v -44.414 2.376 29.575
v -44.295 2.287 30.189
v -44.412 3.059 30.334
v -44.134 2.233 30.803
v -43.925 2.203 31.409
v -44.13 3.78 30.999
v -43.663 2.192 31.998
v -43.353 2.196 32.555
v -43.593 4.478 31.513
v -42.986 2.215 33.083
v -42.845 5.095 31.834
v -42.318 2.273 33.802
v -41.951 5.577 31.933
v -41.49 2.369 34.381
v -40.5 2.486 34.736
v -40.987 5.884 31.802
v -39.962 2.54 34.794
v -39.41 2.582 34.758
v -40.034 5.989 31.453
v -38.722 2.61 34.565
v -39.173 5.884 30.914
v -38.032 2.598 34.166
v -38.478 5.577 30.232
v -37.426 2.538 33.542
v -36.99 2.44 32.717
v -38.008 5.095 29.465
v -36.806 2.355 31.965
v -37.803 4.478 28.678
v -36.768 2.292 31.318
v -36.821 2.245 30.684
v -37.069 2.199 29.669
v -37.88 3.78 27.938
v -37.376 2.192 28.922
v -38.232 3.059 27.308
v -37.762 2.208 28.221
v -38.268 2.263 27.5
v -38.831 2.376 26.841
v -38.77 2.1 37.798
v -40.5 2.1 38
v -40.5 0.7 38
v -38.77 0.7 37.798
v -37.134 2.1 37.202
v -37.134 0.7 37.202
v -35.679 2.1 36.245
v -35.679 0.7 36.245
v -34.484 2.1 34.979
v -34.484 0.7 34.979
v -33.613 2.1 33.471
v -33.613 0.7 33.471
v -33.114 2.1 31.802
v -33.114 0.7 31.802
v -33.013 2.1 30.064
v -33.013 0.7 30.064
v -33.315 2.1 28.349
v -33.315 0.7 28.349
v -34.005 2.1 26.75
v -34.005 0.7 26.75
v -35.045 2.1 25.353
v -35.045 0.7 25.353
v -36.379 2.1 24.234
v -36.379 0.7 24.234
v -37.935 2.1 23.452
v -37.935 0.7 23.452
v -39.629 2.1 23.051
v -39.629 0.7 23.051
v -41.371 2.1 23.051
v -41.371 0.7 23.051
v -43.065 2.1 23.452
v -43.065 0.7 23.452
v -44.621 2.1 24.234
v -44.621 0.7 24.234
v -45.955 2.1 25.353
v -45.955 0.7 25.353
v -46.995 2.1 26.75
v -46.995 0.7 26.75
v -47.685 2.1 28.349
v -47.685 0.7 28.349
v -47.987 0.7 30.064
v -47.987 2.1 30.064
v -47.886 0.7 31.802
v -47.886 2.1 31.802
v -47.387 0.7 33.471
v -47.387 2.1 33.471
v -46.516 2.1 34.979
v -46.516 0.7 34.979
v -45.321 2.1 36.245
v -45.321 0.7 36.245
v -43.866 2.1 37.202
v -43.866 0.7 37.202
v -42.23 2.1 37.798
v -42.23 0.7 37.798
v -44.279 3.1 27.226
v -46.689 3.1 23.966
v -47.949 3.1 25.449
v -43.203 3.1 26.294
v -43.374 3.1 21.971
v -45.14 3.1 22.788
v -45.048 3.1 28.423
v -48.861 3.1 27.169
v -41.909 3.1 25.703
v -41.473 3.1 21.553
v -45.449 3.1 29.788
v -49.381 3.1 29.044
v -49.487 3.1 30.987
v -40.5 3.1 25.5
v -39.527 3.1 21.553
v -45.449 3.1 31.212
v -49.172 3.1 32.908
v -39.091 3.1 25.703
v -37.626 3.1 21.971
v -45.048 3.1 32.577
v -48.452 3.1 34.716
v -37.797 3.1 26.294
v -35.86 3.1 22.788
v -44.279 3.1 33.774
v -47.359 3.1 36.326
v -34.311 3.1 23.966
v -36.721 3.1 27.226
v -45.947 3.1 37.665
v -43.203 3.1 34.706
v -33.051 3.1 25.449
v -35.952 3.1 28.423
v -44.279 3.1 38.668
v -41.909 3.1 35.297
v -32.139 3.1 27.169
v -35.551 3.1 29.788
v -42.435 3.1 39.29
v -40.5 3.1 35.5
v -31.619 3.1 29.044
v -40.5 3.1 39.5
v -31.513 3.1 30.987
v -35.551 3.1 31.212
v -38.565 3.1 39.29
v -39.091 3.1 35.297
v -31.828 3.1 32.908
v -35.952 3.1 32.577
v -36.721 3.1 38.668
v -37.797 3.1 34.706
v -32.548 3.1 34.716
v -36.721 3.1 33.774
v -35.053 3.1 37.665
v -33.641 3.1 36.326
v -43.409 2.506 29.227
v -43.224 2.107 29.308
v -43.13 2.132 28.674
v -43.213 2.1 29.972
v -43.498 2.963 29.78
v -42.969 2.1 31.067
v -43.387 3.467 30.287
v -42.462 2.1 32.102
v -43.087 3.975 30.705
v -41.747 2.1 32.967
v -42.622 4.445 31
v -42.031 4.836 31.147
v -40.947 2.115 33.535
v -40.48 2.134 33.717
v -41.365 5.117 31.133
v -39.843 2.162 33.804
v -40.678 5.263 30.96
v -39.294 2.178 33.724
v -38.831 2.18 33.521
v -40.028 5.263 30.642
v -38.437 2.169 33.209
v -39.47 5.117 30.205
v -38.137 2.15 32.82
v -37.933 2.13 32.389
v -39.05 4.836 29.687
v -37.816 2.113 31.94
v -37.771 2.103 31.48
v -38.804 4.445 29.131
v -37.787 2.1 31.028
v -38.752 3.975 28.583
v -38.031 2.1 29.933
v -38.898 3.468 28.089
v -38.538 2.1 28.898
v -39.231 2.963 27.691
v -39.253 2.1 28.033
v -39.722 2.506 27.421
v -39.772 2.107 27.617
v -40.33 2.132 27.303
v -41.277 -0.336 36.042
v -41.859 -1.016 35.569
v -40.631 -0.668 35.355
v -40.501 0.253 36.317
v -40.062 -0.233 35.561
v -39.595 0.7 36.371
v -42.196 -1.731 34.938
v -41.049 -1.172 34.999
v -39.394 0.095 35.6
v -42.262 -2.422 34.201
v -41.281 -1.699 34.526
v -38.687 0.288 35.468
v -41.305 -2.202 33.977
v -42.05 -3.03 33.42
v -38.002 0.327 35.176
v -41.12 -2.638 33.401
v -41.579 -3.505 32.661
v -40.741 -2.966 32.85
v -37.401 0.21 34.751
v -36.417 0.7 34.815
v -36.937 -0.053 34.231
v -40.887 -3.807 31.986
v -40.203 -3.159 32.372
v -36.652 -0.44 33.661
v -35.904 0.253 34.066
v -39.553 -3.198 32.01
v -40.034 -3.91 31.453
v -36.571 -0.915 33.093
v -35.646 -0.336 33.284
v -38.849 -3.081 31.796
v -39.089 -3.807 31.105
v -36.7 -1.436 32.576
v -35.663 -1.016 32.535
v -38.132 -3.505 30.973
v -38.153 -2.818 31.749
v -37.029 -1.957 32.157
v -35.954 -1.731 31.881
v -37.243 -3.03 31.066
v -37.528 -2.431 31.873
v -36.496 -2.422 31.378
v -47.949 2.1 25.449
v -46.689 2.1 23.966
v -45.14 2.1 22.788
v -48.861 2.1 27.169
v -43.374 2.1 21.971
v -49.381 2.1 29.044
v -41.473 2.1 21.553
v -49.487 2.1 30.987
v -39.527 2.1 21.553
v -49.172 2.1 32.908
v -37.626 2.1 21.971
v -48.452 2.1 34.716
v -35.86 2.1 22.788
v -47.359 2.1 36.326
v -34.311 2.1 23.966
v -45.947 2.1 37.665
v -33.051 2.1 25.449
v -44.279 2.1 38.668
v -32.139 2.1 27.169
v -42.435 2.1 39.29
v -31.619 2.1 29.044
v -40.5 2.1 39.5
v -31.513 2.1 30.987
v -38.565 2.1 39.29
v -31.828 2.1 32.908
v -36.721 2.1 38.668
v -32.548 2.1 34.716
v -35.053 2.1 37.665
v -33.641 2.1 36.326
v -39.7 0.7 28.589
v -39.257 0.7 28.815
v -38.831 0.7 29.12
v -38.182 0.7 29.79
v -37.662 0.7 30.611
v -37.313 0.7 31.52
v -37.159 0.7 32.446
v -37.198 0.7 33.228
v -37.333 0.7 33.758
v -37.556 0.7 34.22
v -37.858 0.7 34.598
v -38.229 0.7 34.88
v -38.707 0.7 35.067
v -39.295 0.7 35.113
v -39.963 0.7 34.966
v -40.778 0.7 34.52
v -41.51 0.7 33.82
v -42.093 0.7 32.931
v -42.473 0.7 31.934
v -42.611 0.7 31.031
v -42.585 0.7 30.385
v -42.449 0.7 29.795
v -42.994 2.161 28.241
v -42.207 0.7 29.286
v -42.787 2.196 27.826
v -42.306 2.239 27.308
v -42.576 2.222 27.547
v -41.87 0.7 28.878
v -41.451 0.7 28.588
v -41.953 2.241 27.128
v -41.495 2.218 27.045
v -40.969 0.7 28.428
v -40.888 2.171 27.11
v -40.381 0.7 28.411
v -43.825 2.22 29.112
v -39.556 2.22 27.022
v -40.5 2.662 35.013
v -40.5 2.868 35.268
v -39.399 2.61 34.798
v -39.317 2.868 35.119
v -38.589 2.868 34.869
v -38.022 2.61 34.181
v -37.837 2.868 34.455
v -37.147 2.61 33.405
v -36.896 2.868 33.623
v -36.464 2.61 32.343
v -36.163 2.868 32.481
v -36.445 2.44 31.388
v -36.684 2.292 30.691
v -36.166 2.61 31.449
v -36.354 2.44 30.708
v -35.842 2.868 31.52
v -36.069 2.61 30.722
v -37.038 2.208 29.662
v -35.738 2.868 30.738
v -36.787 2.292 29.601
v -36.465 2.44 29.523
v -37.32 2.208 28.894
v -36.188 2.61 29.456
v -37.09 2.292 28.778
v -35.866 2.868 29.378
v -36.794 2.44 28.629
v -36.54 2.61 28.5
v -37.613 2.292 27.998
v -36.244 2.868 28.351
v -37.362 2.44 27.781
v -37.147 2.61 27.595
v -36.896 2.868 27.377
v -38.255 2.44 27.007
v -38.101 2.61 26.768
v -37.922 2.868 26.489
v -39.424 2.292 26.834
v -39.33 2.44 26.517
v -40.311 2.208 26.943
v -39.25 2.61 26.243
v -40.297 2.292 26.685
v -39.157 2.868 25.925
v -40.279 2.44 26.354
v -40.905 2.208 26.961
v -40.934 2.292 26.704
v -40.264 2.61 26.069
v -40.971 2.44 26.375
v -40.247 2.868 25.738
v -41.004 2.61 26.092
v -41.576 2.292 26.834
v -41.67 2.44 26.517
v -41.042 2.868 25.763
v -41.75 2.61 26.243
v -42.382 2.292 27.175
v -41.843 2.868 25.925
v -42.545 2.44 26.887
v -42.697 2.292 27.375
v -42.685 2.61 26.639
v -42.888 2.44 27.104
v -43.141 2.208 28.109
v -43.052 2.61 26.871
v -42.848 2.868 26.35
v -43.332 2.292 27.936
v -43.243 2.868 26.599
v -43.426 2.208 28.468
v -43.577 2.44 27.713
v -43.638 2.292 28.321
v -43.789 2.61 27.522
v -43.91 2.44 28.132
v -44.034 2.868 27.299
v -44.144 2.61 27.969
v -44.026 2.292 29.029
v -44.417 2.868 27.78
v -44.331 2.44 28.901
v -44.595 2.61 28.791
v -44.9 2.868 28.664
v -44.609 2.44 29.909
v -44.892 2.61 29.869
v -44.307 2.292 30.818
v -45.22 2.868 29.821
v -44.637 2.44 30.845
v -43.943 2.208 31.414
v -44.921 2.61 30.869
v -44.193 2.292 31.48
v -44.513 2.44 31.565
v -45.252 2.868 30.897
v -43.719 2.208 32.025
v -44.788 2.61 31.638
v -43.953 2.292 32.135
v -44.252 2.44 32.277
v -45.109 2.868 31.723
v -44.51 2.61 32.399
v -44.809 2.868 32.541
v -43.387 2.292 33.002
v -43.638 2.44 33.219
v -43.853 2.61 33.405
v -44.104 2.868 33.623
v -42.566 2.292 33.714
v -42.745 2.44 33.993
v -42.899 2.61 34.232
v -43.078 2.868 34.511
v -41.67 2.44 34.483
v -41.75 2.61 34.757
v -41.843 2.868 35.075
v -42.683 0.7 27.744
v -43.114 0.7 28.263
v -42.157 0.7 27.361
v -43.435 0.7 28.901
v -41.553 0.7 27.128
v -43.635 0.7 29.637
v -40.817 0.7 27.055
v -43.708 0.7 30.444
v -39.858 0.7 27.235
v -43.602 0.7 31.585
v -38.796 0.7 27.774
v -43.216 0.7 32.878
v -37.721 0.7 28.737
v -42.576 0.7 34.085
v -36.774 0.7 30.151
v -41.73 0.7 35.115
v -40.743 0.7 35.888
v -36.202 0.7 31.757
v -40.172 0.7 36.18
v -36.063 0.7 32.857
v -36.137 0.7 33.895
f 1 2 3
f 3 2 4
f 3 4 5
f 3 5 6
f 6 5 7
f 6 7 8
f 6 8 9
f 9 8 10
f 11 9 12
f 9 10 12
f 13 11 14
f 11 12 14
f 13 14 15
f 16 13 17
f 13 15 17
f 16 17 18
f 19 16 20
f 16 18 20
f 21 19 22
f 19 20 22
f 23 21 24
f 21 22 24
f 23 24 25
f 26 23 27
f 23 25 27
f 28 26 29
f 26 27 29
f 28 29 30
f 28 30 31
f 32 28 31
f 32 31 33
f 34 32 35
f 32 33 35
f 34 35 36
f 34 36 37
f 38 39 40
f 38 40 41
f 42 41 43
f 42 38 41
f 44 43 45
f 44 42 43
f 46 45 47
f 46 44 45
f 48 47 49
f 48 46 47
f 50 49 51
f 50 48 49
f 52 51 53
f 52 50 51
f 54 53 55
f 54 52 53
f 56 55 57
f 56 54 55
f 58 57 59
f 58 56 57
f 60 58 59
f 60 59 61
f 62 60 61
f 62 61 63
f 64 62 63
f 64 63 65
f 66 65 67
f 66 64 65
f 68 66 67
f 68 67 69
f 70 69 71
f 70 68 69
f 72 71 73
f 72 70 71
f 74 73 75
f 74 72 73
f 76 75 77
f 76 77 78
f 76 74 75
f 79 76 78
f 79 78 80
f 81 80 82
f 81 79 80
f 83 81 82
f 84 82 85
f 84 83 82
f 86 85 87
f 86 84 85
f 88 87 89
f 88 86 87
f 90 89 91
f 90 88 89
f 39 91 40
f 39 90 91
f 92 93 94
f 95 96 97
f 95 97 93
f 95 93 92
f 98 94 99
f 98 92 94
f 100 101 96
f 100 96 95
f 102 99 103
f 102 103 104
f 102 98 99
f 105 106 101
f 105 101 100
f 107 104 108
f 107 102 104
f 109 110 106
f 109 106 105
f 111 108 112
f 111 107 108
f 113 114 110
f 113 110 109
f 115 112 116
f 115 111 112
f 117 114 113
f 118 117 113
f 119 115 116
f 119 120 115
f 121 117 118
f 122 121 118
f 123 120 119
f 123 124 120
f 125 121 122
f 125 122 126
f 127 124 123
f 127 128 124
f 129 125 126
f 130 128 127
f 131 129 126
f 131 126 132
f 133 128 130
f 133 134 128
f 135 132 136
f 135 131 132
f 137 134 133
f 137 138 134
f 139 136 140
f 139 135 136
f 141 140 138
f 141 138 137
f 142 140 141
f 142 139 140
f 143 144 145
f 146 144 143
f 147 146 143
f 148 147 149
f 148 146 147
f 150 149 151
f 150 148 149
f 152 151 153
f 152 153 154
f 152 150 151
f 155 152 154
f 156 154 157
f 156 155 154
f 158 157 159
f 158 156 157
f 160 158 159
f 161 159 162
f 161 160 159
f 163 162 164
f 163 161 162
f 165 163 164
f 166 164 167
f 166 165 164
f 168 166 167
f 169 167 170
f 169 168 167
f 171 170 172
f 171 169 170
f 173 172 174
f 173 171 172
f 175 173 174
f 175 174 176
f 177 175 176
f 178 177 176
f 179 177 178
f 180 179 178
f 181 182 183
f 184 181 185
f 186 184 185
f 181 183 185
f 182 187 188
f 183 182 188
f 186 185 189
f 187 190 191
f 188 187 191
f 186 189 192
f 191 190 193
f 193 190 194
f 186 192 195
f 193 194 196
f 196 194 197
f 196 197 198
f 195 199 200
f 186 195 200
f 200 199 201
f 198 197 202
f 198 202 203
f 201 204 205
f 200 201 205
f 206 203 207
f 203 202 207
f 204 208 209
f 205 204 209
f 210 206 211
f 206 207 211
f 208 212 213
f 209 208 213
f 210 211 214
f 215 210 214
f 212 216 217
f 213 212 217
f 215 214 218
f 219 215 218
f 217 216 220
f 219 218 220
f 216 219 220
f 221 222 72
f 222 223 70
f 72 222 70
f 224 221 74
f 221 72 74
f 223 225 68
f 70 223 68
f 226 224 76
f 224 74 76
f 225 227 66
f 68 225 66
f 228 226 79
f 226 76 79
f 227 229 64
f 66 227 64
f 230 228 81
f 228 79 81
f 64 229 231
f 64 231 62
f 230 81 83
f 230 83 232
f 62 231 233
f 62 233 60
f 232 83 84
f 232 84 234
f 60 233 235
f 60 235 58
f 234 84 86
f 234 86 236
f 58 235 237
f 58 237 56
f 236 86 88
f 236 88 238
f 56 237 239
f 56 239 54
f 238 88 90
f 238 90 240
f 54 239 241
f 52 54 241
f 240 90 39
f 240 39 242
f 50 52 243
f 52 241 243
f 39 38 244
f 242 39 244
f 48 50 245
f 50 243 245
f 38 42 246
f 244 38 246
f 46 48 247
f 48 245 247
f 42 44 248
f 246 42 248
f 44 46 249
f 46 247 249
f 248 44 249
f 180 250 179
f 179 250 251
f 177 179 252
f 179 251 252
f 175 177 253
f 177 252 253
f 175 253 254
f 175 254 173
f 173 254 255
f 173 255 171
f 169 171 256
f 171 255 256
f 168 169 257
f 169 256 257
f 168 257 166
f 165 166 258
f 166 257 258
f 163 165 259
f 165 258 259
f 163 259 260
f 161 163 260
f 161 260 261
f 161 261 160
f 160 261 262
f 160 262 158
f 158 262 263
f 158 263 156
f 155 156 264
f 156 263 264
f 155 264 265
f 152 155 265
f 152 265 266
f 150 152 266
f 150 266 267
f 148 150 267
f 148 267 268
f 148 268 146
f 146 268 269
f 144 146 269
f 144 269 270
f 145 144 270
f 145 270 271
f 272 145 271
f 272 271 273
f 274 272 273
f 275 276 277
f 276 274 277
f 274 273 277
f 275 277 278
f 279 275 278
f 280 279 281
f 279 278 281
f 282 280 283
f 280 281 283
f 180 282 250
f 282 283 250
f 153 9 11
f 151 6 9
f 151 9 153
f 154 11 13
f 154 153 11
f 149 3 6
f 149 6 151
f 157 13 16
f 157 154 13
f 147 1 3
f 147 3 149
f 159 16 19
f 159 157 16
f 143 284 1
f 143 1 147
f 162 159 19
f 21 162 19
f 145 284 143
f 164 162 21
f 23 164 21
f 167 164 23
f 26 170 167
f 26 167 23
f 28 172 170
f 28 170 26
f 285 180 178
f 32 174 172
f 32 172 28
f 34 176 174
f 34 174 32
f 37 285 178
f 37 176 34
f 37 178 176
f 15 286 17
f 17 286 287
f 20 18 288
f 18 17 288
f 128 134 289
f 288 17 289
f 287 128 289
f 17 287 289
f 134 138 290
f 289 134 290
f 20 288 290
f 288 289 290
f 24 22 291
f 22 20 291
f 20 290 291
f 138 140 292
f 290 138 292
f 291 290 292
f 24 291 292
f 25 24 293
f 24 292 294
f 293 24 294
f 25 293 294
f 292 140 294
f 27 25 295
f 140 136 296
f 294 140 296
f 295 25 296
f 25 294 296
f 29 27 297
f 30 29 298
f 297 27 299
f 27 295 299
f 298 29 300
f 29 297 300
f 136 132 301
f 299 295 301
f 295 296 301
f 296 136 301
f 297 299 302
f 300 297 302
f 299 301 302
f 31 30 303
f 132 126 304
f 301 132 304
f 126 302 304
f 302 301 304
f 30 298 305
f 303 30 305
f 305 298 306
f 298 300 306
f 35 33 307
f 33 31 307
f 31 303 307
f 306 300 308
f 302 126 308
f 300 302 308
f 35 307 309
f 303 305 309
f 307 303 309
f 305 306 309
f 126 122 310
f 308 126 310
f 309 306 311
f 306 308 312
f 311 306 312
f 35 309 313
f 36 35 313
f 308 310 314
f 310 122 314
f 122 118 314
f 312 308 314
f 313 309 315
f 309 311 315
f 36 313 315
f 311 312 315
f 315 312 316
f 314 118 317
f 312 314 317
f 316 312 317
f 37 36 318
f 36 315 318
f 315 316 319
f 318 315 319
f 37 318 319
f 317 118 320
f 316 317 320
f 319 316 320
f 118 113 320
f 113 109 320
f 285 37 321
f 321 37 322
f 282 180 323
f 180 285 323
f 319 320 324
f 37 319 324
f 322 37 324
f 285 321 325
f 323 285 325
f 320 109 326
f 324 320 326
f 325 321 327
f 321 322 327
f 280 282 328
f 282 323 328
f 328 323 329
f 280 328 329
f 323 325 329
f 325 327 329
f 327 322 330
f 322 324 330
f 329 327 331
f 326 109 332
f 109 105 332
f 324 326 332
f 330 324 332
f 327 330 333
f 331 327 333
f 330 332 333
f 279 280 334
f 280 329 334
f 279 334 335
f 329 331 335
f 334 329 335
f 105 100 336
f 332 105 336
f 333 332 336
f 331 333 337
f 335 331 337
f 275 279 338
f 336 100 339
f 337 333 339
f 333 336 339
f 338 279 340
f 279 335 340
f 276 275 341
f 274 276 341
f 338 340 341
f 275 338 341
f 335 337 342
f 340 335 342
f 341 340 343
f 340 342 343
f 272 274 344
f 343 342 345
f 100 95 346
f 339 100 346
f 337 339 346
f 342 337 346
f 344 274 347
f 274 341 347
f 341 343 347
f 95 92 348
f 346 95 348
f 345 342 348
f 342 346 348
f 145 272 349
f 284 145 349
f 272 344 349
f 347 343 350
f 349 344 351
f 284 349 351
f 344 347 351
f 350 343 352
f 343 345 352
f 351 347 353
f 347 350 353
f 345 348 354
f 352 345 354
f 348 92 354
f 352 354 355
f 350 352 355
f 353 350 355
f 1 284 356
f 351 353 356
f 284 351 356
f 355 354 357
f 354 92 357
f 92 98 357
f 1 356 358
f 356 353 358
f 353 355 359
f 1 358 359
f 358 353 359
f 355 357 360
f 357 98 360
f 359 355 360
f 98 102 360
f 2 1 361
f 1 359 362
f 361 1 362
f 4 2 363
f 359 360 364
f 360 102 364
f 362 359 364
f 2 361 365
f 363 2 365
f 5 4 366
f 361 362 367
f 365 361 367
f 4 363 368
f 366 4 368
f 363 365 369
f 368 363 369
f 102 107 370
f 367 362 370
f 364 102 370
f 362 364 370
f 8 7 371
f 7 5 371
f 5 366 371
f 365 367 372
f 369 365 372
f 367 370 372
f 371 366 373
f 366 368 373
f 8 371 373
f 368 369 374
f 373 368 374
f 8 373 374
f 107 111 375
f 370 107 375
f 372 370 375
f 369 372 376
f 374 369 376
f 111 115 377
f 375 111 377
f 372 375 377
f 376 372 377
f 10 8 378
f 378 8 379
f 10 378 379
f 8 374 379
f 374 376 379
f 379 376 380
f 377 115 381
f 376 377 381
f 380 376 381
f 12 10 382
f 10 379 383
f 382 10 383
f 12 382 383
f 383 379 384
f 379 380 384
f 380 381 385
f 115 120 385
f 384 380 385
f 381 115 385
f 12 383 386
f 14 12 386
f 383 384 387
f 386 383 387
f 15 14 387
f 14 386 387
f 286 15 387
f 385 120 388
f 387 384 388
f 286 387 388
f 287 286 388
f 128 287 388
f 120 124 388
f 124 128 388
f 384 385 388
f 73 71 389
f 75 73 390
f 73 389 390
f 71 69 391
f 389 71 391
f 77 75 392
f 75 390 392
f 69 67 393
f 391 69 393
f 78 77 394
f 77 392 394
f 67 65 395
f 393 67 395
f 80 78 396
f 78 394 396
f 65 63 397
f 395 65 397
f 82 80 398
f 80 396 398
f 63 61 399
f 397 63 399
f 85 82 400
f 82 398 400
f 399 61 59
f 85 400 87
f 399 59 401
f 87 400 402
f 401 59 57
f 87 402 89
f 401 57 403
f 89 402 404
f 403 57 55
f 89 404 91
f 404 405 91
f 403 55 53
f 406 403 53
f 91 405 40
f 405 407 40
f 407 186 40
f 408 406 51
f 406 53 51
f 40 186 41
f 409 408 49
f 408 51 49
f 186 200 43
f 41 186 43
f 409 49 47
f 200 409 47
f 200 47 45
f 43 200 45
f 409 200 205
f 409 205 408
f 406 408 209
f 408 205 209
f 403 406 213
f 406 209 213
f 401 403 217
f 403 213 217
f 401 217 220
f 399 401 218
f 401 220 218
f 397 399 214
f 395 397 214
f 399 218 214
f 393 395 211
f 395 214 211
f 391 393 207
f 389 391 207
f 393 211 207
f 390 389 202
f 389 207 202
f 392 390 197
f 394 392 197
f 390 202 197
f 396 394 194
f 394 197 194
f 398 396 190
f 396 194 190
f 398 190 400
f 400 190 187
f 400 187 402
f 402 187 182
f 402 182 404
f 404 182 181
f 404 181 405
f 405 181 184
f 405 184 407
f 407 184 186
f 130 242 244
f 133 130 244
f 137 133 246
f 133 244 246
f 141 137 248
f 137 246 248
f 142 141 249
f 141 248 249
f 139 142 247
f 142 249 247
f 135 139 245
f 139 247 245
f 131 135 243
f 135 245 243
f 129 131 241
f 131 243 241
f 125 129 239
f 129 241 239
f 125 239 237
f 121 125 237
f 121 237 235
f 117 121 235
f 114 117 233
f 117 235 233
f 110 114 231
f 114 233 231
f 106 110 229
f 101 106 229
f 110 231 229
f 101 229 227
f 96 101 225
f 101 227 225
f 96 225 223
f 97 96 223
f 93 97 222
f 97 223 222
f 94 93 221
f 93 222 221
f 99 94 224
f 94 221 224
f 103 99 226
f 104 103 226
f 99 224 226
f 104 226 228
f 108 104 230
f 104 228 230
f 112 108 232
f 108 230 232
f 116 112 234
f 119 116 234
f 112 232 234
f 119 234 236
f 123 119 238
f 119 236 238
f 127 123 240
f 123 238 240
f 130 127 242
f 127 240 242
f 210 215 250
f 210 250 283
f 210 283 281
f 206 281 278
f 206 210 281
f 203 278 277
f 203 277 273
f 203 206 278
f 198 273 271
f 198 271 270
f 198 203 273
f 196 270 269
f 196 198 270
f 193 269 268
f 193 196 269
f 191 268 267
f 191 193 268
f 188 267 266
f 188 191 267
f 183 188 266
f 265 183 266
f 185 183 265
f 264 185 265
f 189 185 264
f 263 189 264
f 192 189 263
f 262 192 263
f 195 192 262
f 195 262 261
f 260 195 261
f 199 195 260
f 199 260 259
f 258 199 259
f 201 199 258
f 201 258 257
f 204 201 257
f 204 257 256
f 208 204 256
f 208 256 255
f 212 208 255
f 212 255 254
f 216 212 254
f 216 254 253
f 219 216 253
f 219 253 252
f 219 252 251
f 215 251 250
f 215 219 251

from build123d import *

# Parameters (mm, degrees)
SKETCH1_R           = 7.5
BOSS_EXTRUDE2_DEPTH = 1.4
SKETCH3_R           = 9
SKETCH3_R_2         = 5
BOSS_EXTRUDE3_DEPTH = 1
FILLET1_R           = 3
SKETCH4_R           = 3.5
SKETCH4_R_2         = 2.5
BOSS_EXTRUDE5_DEPTH = 7
SKETCH5_R           = 2.5
CUT_EXTRUDE1_DEPTH  = 64.560554084


with BuildPart() as part:
    # Sketch1 → Boss-Extrude2 (new body)
    with BuildSketch(Plane(origin=(0, 2.1, 0), x_dir=(1, 0, 0), z_dir=(0, 1, 0))):
        with Locations(Location((-40.5, -30.5, 0), (0, 0, 270))):
            Circle(SKETCH1_R)
    extrude(amount=-BOSS_EXTRUDE2_DEPTH)

    # Sketch3 → Boss-Extrude3 (add)
    with BuildSketch(Plane(origin=(0, 2.1, 0), x_dir=(1, 0, 0), z_dir=(0, 1, 0))):
        with Locations(Location((-40.5, -30.5, 0), (0, 0, 270))):
            Circle(SKETCH3_R)
        with Locations(Location((-40.5, -30.5, 0), (0, 0, 270))):
            Circle(SKETCH3_R_2, mode=Mode.SUBTRACT)
    extrude(amount=BOSS_EXTRUDE3_DEPTH)

    # Fillet1
    # the kernel refuses this fillet: 3 mm, written as the material it adds along each edge
    with BuildSketch(Plane(origin=(-40.5, 2.1, 30.5), x_dir=(0, 0, 1), z_dir=(-1, 0, 0))) as fillet1_piece_1:
        with BuildLine():
            CenterArc((2.763932023, 3), FILLET1_R, 270, 48.189685104)
            Line((2.763932023, 0), (2.763932023, -0.06))
            Line((2.763932023, -0.06), (5, -0.06))
            Line((5, -0.06), (5.06, 0))
            ThreePointArc((5.06, 0), (5.06, 0.5), (5.04472136, 0.96))
            Line((5.04472136, 0.96), (5, 1))
        make_face()
    revolve(axis=Axis((-40.5, 2.1, 30.5), (0, 1, 0)))

    # Sketch4 → Boss-Extrude5 (add)
    with BuildSketch(Plane(origin=(-38.945196608, -1.435533906, 33.675308869), x_dir=(0.9504227777675709, 0.2313522039987804, -0.20778041583720402), z_dir=(-0.3109606783832559, 0.7071067811865516, -0.6350617737664737))):
        Circle(SKETCH4_R)
        with Locations(Location((0, 0, 0), (0, 0, 70.528842864))):
            Circle(SKETCH4_R_2, mode=Mode.SUBTRACT)
    extrude(amount=BOSS_EXTRUDE5_DEPTH)

    # Sketch5 → Cut-Extrude1 (cut, through all)
    with BuildSketch(Plane(origin=(3.199957151, -7.276519373, 6.535136451), x_dir=(0.9504227777675709, 0.2313522039987803, -0.20778041583720397), z_dir=(0.3109606783832558, -0.7071067811865516, 0.6350617737664735))):
        with Locations(Location((-44.343585554, 24.094947098, 0), (0, 0, 289.471157136))):
            Circle(SKETCH5_R)
    extrude(amount=-CUT_EXTRUDE1_DEPTH, mode=Mode.SUBTRACT)


solid = part.part
